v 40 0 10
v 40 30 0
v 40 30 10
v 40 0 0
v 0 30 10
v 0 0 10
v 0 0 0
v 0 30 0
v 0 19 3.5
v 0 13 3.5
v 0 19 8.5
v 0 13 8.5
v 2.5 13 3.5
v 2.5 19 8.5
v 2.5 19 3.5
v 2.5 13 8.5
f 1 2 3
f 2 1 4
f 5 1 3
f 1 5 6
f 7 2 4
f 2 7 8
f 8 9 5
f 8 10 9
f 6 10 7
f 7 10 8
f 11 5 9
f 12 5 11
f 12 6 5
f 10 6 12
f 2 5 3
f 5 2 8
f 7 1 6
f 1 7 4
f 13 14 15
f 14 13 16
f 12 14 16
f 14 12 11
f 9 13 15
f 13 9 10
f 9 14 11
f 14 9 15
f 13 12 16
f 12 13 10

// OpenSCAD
// units=mm — generated by scad_emitter.py
// part=unnamed
$fn = 48;

difference() { cube([40, 30, 10]); translate([-0.5, 13, 3.5]) cube([3, 6, 5]); }
